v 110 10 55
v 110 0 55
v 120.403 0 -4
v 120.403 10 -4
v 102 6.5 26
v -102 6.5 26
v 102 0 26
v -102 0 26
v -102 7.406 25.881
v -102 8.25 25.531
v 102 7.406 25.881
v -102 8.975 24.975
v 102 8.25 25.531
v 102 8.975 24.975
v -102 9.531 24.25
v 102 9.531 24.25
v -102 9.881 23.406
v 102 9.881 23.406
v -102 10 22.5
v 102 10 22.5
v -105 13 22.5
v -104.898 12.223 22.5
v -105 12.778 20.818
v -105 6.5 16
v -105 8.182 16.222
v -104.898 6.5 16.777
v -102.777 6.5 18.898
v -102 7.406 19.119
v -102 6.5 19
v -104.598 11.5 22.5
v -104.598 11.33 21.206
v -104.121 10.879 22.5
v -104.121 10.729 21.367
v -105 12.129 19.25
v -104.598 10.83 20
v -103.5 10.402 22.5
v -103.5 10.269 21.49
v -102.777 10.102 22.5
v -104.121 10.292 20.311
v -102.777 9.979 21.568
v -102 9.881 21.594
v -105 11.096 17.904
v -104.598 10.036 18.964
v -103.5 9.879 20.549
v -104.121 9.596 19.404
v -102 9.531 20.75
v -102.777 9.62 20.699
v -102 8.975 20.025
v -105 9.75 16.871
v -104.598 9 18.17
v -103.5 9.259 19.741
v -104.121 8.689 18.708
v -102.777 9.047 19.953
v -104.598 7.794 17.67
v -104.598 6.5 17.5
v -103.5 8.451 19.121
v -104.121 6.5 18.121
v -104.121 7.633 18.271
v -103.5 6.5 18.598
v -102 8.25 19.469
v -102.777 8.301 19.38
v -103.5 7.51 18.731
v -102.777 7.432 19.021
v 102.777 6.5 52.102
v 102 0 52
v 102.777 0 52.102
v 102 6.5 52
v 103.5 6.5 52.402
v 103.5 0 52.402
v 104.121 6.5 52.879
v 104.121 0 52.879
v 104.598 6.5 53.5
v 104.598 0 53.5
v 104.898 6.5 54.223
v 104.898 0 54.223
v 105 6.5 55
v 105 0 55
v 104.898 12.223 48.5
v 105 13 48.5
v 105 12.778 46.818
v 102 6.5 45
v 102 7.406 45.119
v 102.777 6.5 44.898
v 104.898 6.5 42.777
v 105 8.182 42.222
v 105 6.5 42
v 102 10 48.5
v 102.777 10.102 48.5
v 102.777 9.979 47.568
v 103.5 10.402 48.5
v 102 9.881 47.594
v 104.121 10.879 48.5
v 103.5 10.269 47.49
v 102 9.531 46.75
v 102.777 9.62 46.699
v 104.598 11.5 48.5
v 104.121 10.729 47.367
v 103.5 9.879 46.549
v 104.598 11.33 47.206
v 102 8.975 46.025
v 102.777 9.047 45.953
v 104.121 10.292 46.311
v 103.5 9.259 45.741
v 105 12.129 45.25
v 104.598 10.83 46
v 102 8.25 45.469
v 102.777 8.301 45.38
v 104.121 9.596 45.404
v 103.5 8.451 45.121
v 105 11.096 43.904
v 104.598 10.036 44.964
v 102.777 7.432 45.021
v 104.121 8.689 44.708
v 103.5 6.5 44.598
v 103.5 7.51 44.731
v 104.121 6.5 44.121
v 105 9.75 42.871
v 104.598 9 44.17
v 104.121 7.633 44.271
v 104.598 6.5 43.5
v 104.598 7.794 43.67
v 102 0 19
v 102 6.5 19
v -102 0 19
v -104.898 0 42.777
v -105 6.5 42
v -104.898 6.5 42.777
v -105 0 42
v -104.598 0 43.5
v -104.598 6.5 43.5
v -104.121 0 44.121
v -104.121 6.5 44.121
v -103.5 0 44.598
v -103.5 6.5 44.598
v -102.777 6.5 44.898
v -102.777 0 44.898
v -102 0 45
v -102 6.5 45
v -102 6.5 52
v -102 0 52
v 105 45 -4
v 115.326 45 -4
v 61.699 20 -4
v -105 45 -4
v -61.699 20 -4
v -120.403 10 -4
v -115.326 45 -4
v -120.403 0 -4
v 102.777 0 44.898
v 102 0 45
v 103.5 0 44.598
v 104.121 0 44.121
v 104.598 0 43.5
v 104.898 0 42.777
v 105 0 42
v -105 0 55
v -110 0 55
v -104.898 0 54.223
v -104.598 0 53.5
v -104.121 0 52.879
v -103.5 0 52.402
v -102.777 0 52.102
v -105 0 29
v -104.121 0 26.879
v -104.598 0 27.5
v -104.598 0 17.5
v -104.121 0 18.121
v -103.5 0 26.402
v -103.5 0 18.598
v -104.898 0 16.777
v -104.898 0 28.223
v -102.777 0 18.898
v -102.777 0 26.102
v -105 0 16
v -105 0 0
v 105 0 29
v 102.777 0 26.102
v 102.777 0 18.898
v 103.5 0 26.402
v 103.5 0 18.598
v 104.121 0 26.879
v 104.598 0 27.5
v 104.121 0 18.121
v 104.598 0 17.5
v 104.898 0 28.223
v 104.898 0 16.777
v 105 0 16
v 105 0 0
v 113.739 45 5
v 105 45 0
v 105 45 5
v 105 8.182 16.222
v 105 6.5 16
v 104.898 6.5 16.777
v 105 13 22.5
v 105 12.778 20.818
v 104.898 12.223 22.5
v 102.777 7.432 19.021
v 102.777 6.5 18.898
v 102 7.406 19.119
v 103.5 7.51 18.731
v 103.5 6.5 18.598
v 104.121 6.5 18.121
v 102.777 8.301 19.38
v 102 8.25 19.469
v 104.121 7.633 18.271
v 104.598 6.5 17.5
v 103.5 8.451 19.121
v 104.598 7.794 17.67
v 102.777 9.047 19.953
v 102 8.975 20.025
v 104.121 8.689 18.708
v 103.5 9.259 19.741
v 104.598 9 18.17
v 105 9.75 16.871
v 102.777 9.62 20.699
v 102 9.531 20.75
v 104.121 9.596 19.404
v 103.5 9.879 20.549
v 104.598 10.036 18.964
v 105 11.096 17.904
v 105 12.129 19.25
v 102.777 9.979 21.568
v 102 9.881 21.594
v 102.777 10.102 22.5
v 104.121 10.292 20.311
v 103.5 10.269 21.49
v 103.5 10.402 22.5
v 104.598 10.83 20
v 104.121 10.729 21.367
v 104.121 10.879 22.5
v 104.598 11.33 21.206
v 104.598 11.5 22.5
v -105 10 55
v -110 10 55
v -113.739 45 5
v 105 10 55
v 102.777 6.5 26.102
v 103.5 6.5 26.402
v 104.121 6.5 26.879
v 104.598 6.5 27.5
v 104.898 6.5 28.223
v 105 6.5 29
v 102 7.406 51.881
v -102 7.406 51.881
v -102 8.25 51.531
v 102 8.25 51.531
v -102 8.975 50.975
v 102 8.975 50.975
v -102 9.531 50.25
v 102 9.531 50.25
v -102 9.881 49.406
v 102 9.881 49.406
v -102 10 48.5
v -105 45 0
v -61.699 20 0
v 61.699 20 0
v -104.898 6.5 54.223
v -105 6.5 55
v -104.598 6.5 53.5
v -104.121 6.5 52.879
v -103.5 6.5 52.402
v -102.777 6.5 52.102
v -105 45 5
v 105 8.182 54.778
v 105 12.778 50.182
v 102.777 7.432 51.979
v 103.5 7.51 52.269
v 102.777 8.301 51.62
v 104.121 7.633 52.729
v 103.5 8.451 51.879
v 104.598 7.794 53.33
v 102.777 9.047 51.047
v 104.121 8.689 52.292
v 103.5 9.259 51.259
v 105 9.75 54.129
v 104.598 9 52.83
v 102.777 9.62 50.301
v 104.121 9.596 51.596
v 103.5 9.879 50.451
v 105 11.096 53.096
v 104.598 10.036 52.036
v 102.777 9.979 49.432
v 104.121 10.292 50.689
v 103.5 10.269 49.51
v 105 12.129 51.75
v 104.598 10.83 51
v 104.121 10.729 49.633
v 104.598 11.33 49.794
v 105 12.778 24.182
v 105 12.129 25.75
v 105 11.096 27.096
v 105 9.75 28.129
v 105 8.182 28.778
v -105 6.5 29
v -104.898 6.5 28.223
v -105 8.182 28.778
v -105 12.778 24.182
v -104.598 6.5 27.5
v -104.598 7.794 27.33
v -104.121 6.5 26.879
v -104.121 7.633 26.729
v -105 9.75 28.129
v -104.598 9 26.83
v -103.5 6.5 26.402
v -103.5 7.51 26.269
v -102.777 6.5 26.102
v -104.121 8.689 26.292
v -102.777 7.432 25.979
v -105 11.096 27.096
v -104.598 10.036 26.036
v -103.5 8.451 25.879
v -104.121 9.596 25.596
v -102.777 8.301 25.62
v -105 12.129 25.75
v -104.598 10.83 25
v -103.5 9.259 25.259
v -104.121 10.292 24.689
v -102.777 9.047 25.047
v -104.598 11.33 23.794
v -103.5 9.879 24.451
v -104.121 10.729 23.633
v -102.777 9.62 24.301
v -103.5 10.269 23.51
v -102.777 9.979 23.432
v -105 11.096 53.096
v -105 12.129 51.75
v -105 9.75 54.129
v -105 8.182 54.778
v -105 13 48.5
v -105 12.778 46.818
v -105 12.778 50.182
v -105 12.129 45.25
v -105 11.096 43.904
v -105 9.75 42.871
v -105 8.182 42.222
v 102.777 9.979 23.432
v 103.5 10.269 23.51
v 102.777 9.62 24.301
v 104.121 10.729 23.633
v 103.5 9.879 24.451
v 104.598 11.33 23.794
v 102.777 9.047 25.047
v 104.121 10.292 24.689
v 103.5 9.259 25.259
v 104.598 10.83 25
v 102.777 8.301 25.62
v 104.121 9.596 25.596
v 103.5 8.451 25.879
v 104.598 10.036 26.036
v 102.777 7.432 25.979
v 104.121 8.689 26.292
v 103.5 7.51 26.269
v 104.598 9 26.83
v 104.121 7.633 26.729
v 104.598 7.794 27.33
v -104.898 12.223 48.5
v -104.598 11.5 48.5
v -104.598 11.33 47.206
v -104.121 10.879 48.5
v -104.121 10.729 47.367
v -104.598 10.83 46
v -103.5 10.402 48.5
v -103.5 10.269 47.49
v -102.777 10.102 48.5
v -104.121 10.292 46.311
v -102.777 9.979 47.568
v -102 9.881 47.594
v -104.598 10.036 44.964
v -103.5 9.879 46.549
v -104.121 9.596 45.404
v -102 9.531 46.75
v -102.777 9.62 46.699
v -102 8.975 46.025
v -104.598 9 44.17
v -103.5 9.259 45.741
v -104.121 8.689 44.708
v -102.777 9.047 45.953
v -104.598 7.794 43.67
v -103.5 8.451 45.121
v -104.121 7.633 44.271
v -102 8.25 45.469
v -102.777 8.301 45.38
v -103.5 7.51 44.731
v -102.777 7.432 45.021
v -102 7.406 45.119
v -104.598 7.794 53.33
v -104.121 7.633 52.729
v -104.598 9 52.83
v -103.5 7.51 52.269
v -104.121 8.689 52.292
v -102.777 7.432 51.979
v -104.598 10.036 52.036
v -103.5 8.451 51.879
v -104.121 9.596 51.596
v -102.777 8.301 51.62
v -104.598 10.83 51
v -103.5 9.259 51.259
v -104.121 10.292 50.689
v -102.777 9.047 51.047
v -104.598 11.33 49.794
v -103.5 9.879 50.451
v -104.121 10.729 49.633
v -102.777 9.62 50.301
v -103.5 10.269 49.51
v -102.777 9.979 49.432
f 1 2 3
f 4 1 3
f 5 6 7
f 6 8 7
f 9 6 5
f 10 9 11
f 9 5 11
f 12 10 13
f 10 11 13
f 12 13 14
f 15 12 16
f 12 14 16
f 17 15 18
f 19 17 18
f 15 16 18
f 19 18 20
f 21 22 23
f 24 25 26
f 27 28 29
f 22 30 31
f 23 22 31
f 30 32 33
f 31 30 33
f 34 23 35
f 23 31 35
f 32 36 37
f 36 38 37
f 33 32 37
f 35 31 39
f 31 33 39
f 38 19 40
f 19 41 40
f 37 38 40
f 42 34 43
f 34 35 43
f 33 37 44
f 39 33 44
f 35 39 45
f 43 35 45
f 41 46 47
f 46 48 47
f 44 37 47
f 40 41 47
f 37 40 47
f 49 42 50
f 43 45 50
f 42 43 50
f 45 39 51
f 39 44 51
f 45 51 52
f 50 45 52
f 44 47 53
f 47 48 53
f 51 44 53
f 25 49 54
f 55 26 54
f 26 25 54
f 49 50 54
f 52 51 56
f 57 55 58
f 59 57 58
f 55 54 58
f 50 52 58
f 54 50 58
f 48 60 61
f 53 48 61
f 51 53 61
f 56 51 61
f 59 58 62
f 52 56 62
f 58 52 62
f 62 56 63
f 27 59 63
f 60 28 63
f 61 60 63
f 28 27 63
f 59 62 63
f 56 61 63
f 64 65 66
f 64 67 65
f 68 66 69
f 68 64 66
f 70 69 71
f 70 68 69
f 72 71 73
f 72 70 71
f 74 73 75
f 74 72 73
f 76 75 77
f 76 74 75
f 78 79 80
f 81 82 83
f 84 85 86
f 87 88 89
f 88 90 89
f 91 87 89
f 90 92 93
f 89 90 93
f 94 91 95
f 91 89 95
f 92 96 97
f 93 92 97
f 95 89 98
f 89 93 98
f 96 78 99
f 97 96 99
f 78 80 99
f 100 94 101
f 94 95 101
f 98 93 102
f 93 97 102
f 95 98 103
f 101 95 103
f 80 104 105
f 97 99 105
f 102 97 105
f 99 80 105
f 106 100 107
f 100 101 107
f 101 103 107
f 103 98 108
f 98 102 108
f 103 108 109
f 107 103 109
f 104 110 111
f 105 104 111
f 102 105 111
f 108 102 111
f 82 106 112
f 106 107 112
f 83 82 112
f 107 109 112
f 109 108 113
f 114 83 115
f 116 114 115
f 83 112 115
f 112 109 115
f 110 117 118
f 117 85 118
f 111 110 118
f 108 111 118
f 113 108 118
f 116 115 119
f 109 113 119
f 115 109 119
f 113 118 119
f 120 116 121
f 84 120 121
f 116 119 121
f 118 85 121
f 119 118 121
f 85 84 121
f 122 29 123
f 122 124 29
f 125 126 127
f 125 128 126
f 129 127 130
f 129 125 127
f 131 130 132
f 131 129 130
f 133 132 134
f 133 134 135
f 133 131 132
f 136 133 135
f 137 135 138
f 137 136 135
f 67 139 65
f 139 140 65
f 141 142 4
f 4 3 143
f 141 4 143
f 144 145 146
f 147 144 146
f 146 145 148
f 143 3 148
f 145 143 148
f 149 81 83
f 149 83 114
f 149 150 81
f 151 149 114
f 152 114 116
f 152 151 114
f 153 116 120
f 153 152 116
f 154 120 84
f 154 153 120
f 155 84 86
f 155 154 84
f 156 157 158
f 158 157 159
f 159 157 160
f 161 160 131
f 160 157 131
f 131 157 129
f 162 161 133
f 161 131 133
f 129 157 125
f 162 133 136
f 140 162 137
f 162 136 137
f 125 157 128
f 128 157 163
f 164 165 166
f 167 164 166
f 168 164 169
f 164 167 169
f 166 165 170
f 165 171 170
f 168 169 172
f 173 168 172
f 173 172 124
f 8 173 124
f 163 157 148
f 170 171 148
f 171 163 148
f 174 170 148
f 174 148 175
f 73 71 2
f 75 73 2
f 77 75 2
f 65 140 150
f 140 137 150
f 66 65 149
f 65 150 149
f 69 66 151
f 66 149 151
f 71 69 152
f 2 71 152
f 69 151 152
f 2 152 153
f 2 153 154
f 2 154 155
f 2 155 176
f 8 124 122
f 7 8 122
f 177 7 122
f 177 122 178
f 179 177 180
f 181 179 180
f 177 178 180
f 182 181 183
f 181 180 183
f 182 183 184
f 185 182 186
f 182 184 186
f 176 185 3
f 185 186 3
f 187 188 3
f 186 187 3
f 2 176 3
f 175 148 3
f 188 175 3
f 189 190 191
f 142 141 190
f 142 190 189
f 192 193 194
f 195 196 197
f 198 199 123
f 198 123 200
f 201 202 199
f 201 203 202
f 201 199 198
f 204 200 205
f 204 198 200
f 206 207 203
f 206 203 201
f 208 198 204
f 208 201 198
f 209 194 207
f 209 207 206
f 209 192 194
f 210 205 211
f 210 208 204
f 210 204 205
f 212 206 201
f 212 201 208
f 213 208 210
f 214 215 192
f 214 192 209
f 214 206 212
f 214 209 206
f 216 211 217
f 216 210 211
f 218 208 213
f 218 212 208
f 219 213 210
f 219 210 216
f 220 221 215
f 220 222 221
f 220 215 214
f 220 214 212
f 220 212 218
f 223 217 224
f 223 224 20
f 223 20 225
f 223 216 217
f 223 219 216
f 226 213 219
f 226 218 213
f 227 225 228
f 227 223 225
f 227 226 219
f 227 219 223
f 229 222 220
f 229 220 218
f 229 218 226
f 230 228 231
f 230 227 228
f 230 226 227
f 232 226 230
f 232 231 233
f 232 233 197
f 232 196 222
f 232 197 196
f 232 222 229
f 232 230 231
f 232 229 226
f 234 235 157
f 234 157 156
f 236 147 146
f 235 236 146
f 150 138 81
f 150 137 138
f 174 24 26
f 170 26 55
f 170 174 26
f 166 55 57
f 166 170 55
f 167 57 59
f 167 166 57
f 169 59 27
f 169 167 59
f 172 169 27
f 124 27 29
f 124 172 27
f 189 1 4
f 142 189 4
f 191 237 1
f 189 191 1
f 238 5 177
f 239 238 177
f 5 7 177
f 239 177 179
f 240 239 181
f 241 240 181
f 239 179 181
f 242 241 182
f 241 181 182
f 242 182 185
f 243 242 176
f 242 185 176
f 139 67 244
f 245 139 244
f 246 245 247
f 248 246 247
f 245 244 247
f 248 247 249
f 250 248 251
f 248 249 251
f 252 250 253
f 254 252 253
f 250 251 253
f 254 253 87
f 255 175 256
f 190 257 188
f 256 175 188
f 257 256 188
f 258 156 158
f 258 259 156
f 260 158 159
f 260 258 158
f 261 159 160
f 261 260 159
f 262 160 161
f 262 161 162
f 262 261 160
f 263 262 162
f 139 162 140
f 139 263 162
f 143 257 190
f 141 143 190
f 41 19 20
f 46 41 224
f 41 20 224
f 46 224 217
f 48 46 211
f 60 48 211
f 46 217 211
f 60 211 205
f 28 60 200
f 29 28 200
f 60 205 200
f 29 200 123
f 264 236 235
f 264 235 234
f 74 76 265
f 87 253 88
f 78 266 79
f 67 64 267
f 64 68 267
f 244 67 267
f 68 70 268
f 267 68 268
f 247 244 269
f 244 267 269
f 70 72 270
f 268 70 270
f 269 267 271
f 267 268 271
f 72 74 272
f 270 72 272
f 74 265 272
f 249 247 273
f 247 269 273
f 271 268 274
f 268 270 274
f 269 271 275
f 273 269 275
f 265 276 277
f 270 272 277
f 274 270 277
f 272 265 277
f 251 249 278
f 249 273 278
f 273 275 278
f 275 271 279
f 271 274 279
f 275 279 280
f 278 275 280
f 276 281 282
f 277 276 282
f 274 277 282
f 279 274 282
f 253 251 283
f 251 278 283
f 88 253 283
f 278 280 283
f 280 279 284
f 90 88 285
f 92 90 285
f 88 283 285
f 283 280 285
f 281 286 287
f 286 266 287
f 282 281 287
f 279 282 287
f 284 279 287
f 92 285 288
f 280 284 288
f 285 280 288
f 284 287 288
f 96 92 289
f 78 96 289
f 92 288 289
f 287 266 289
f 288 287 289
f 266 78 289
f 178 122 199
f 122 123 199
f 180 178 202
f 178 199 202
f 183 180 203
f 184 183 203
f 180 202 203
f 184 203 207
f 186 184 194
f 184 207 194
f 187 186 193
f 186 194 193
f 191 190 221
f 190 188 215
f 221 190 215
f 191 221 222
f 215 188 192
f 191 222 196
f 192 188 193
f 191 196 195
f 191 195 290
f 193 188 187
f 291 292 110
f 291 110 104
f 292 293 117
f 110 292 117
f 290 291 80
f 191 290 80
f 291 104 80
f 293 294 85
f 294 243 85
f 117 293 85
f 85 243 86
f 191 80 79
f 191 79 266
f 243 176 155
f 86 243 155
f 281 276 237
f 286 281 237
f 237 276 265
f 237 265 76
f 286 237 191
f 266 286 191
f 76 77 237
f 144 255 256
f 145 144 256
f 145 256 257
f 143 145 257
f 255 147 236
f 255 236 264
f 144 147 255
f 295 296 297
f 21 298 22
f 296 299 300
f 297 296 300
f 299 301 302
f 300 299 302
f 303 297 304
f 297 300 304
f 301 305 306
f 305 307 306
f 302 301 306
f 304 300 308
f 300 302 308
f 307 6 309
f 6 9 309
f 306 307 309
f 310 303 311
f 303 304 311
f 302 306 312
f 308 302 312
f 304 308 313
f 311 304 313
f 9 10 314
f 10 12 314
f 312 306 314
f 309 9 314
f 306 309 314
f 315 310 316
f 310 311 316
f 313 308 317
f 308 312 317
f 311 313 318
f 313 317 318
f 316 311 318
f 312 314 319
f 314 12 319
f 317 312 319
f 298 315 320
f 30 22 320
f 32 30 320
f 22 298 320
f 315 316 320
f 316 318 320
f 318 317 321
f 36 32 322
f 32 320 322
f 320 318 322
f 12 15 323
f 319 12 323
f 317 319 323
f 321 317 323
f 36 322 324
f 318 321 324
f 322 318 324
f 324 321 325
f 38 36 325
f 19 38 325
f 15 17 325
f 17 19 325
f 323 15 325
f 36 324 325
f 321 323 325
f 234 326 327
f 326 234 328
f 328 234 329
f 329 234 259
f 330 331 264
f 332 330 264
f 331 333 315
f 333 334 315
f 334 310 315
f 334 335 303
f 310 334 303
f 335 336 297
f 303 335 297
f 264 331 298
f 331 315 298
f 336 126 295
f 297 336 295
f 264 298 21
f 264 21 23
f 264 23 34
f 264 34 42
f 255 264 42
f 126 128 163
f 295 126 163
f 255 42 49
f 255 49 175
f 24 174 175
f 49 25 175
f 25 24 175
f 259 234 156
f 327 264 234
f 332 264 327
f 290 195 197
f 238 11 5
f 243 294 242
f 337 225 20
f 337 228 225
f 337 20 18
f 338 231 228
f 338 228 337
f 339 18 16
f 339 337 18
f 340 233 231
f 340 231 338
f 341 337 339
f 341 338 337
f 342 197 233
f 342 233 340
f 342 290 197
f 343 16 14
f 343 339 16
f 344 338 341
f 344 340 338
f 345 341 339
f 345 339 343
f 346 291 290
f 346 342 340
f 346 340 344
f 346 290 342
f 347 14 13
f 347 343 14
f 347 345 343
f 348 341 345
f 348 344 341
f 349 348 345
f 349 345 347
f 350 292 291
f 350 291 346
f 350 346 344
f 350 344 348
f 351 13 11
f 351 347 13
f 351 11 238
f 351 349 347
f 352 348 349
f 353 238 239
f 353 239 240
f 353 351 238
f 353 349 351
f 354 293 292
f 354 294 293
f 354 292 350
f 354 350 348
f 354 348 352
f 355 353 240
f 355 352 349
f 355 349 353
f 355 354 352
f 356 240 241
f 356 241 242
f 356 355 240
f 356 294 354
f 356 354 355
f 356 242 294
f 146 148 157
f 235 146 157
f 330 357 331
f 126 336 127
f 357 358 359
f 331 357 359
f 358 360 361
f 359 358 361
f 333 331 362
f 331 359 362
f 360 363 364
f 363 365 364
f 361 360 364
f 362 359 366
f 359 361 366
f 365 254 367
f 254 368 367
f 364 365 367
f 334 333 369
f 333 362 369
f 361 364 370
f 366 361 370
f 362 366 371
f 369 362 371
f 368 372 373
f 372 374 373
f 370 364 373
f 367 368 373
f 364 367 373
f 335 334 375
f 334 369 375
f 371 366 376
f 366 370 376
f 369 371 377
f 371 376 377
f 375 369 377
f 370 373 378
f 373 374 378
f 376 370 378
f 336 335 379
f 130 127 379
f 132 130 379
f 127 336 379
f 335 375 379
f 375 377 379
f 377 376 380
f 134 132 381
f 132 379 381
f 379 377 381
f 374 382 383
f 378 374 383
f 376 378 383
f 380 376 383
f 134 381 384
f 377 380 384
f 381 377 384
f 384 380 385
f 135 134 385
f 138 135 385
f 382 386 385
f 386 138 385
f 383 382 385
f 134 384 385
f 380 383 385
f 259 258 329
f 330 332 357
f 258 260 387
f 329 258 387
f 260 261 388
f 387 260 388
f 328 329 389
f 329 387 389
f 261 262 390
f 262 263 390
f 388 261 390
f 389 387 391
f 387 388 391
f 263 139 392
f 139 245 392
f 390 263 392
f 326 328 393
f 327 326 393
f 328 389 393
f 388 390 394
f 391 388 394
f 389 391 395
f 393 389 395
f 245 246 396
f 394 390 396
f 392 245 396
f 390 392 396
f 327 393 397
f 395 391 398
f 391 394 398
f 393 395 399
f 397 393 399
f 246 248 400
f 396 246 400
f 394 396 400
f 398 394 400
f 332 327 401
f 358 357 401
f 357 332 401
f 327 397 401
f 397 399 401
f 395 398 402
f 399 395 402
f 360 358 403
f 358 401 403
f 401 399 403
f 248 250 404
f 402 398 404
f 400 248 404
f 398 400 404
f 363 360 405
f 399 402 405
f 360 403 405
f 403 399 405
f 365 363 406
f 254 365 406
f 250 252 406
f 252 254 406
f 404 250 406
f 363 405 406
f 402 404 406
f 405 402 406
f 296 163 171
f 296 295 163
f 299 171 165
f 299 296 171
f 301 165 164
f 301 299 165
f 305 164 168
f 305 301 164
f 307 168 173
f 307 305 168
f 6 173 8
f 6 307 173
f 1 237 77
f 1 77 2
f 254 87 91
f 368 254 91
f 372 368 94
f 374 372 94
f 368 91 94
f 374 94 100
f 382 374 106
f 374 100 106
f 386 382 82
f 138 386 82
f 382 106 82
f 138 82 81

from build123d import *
from OCP.BRepFilletAPI import BRepFilletAPI_MakeChamfer

# Parameters (mm, degrees)
AUFSATZ_LINEAR_AUSTRAGEN1_DEPTH = 45
FASE1_SIZE                      = 35
FASE1_SIZE2                     = 50
FASE2_SIZE                      = 35
FASE2_SIZE2                     = 5
SCHNITT_LINEAR_AUSTRAGEN2_DEPTH = 140.810416962
SKIZZE4_W                       = 210
SKIZZE4_H                       = 7
AUFSATZ_LINEAR_AUSTRAGEN2_DEPTH = 10
VERRUNDUNG2_R                   = 3.5
VERRUNDUNG3_R                   = 3


with BuildPart() as part:
    # Skizze1 → Aufsatz-Linear austragen1 (new body)
    with BuildSketch(Plane(origin=(0, 0, 0), x_dir=(1, 0, 0), z_dir=(0, 1, 0))):
        Polygon((-105, -55), (-105, 0), (105, 0), (105, -55), (110, -55), (120.403291862, 4), (-120.403291862, 4), (-110, -55), align=None)
    extrude(amount=AUFSATZ_LINEAR_AUSTRAGEN1_DEPTH)

    # Fase1: one chamfer whose edges measure the first distance from different faces: ONE call of the kernel's chamfer builder (chamfer() names one face for all edges)
    fase1_edges_1 = [part.edges().sort_by_distance(p)[0] for p in [
        (107.5, 45, 55),
    ]]
    fase1_side_1 = [part.faces().sort_by_distance(p)[0] for p in [
        (107.5, 22.5, 55),
    ]]
    fase1_edges_2 = [part.edges().sort_by_distance(p)[0] for p in [
        (-107.5, 45, 55),
    ]]
    fase1_side_2 = [part.faces().sort_by_distance(p)[0] for p in [
        (-107.5, 22.5, 55),
    ]]
    fase1 = BRepFilletAPI_MakeChamfer(part.part.solid().wrapped)
    for e in fase1_edges_1:
        fase1.Add(FASE1_SIZE, FASE1_SIZE2, e.wrapped, fase1_side_1[0].wrapped)  # the first distance lies on this face
    for e in fase1_edges_2:
        fase1.Add(FASE1_SIZE, FASE1_SIZE2, e.wrapped, fase1_side_2[0].wrapped)  # the first distance lies on this face
    add(Compound.cast(fase1.Shape()), mode=Mode.REPLACE)

    # Fase2: one chamfer whose edges measure the first distance from different faces: ONE call of the kernel's chamfer builder (chamfer() names one face for all edges)
    fase2_edges_1 = [part.edges().sort_by_distance(p)[0] for p in [
        (-119.609820449, 45, 0.5),
    ]]
    fase2_side_1 = [part.faces().sort_by_distance(p)[0] for p in [
        (-116.314008321, 17.174625468, 19.191479401),
    ]]
    fase2_edges_2 = [part.edges().sort_by_distance(p)[0] for p in [
        (119.609820449, 45, 0.5),
    ]]
    fase2_side_2 = [part.faces().sort_by_distance(p)[0] for p in [
        (116.314008321, 17.174625468, 19.191479401),
    ]]
    fase2 = BRepFilletAPI_MakeChamfer(part.part.solid().wrapped)
    for e in fase2_edges_1:
        fase2.Add(FASE2_SIZE, FASE2_SIZE2, e.wrapped, fase2_side_1[0].wrapped)  # the first distance lies on this face
    for e in fase2_edges_2:
        fase2.Add(FASE2_SIZE, FASE2_SIZE2, e.wrapped, fase2_side_2[0].wrapped)  # the first distance lies on this face
    add(Compound.cast(fase2.Shape()), mode=Mode.REPLACE)

    # Skizze2 → Schnitt-Linear austragen2 (cut, through all)
    with BuildSketch(Plane.XY):
        Polygon((-105, 45), (-61.698729811, 20), (61.698729811, 20), (105, 45), align=None)
    extrude(amount=-SCHNITT_LINEAR_AUSTRAGEN2_DEPTH, mode=Mode.SUBTRACT)

    # Skizze4 → Aufsatz-Linear austragen2 (add)
    with BuildSketch(Plane(origin=(0, 0, 0), x_dir=(1, 0, 0), z_dir=(0, 1, 0))):
        with Locations((0, -48.5)):
            Rectangle(SKIZZE4_W, SKIZZE4_H)
        with Locations((0, -22.5)):
            Rectangle(SKIZZE4_W, SKIZZE4_H)
    extrude(amount=AUFSATZ_LINEAR_AUSTRAGEN2_DEPTH)

    # Verrundung2
    verrundung2_edges = [part.edges().sort_by_distance(p)[0] for p in [
        (0, 10, 52),
        (0, 10, 45),
        (0, 10, 19),
        (0, 10, 26),
    ]]
    fillet(verrundung2_edges, radius=VERRUNDUNG2_R - 0.0001)  # a hair under: the kernel refuses the full size

    # Verrundung3
    verrundung3_edges = [part.edges().sort_by_distance(p)[0] for p in [
        (-105, 8.974903023, 24.974903023),
        (105, 3.25005, 52),
        (-105, 3.25005, 52),
        (-105, 3.25005, 45),
        (105, 3.25005, 45),
        (-105, 3.25005, 19),
        (105, 3.25005, 19),
        (105, 3.25005, 26),
        (-105, 3.25005, 26),
        (105, 8.974903023, 50.974903023),
        (-105, 8.974903023, 50.974903023),
        (-105, 8.974903023, 46.025096977),
        (105, 8.974903023, 46.025096977),
        (-105, 8.974903023, 20.025096977),
        (105, 8.974903023, 20.025096977),
        (105, 8.974903023, 24.974903023),
    ]]
    fillet(verrundung3_edges, radius=VERRUNDUNG3_R - 0.0001)  # a hair under: the kernel refuses the full size


solid = part.part
